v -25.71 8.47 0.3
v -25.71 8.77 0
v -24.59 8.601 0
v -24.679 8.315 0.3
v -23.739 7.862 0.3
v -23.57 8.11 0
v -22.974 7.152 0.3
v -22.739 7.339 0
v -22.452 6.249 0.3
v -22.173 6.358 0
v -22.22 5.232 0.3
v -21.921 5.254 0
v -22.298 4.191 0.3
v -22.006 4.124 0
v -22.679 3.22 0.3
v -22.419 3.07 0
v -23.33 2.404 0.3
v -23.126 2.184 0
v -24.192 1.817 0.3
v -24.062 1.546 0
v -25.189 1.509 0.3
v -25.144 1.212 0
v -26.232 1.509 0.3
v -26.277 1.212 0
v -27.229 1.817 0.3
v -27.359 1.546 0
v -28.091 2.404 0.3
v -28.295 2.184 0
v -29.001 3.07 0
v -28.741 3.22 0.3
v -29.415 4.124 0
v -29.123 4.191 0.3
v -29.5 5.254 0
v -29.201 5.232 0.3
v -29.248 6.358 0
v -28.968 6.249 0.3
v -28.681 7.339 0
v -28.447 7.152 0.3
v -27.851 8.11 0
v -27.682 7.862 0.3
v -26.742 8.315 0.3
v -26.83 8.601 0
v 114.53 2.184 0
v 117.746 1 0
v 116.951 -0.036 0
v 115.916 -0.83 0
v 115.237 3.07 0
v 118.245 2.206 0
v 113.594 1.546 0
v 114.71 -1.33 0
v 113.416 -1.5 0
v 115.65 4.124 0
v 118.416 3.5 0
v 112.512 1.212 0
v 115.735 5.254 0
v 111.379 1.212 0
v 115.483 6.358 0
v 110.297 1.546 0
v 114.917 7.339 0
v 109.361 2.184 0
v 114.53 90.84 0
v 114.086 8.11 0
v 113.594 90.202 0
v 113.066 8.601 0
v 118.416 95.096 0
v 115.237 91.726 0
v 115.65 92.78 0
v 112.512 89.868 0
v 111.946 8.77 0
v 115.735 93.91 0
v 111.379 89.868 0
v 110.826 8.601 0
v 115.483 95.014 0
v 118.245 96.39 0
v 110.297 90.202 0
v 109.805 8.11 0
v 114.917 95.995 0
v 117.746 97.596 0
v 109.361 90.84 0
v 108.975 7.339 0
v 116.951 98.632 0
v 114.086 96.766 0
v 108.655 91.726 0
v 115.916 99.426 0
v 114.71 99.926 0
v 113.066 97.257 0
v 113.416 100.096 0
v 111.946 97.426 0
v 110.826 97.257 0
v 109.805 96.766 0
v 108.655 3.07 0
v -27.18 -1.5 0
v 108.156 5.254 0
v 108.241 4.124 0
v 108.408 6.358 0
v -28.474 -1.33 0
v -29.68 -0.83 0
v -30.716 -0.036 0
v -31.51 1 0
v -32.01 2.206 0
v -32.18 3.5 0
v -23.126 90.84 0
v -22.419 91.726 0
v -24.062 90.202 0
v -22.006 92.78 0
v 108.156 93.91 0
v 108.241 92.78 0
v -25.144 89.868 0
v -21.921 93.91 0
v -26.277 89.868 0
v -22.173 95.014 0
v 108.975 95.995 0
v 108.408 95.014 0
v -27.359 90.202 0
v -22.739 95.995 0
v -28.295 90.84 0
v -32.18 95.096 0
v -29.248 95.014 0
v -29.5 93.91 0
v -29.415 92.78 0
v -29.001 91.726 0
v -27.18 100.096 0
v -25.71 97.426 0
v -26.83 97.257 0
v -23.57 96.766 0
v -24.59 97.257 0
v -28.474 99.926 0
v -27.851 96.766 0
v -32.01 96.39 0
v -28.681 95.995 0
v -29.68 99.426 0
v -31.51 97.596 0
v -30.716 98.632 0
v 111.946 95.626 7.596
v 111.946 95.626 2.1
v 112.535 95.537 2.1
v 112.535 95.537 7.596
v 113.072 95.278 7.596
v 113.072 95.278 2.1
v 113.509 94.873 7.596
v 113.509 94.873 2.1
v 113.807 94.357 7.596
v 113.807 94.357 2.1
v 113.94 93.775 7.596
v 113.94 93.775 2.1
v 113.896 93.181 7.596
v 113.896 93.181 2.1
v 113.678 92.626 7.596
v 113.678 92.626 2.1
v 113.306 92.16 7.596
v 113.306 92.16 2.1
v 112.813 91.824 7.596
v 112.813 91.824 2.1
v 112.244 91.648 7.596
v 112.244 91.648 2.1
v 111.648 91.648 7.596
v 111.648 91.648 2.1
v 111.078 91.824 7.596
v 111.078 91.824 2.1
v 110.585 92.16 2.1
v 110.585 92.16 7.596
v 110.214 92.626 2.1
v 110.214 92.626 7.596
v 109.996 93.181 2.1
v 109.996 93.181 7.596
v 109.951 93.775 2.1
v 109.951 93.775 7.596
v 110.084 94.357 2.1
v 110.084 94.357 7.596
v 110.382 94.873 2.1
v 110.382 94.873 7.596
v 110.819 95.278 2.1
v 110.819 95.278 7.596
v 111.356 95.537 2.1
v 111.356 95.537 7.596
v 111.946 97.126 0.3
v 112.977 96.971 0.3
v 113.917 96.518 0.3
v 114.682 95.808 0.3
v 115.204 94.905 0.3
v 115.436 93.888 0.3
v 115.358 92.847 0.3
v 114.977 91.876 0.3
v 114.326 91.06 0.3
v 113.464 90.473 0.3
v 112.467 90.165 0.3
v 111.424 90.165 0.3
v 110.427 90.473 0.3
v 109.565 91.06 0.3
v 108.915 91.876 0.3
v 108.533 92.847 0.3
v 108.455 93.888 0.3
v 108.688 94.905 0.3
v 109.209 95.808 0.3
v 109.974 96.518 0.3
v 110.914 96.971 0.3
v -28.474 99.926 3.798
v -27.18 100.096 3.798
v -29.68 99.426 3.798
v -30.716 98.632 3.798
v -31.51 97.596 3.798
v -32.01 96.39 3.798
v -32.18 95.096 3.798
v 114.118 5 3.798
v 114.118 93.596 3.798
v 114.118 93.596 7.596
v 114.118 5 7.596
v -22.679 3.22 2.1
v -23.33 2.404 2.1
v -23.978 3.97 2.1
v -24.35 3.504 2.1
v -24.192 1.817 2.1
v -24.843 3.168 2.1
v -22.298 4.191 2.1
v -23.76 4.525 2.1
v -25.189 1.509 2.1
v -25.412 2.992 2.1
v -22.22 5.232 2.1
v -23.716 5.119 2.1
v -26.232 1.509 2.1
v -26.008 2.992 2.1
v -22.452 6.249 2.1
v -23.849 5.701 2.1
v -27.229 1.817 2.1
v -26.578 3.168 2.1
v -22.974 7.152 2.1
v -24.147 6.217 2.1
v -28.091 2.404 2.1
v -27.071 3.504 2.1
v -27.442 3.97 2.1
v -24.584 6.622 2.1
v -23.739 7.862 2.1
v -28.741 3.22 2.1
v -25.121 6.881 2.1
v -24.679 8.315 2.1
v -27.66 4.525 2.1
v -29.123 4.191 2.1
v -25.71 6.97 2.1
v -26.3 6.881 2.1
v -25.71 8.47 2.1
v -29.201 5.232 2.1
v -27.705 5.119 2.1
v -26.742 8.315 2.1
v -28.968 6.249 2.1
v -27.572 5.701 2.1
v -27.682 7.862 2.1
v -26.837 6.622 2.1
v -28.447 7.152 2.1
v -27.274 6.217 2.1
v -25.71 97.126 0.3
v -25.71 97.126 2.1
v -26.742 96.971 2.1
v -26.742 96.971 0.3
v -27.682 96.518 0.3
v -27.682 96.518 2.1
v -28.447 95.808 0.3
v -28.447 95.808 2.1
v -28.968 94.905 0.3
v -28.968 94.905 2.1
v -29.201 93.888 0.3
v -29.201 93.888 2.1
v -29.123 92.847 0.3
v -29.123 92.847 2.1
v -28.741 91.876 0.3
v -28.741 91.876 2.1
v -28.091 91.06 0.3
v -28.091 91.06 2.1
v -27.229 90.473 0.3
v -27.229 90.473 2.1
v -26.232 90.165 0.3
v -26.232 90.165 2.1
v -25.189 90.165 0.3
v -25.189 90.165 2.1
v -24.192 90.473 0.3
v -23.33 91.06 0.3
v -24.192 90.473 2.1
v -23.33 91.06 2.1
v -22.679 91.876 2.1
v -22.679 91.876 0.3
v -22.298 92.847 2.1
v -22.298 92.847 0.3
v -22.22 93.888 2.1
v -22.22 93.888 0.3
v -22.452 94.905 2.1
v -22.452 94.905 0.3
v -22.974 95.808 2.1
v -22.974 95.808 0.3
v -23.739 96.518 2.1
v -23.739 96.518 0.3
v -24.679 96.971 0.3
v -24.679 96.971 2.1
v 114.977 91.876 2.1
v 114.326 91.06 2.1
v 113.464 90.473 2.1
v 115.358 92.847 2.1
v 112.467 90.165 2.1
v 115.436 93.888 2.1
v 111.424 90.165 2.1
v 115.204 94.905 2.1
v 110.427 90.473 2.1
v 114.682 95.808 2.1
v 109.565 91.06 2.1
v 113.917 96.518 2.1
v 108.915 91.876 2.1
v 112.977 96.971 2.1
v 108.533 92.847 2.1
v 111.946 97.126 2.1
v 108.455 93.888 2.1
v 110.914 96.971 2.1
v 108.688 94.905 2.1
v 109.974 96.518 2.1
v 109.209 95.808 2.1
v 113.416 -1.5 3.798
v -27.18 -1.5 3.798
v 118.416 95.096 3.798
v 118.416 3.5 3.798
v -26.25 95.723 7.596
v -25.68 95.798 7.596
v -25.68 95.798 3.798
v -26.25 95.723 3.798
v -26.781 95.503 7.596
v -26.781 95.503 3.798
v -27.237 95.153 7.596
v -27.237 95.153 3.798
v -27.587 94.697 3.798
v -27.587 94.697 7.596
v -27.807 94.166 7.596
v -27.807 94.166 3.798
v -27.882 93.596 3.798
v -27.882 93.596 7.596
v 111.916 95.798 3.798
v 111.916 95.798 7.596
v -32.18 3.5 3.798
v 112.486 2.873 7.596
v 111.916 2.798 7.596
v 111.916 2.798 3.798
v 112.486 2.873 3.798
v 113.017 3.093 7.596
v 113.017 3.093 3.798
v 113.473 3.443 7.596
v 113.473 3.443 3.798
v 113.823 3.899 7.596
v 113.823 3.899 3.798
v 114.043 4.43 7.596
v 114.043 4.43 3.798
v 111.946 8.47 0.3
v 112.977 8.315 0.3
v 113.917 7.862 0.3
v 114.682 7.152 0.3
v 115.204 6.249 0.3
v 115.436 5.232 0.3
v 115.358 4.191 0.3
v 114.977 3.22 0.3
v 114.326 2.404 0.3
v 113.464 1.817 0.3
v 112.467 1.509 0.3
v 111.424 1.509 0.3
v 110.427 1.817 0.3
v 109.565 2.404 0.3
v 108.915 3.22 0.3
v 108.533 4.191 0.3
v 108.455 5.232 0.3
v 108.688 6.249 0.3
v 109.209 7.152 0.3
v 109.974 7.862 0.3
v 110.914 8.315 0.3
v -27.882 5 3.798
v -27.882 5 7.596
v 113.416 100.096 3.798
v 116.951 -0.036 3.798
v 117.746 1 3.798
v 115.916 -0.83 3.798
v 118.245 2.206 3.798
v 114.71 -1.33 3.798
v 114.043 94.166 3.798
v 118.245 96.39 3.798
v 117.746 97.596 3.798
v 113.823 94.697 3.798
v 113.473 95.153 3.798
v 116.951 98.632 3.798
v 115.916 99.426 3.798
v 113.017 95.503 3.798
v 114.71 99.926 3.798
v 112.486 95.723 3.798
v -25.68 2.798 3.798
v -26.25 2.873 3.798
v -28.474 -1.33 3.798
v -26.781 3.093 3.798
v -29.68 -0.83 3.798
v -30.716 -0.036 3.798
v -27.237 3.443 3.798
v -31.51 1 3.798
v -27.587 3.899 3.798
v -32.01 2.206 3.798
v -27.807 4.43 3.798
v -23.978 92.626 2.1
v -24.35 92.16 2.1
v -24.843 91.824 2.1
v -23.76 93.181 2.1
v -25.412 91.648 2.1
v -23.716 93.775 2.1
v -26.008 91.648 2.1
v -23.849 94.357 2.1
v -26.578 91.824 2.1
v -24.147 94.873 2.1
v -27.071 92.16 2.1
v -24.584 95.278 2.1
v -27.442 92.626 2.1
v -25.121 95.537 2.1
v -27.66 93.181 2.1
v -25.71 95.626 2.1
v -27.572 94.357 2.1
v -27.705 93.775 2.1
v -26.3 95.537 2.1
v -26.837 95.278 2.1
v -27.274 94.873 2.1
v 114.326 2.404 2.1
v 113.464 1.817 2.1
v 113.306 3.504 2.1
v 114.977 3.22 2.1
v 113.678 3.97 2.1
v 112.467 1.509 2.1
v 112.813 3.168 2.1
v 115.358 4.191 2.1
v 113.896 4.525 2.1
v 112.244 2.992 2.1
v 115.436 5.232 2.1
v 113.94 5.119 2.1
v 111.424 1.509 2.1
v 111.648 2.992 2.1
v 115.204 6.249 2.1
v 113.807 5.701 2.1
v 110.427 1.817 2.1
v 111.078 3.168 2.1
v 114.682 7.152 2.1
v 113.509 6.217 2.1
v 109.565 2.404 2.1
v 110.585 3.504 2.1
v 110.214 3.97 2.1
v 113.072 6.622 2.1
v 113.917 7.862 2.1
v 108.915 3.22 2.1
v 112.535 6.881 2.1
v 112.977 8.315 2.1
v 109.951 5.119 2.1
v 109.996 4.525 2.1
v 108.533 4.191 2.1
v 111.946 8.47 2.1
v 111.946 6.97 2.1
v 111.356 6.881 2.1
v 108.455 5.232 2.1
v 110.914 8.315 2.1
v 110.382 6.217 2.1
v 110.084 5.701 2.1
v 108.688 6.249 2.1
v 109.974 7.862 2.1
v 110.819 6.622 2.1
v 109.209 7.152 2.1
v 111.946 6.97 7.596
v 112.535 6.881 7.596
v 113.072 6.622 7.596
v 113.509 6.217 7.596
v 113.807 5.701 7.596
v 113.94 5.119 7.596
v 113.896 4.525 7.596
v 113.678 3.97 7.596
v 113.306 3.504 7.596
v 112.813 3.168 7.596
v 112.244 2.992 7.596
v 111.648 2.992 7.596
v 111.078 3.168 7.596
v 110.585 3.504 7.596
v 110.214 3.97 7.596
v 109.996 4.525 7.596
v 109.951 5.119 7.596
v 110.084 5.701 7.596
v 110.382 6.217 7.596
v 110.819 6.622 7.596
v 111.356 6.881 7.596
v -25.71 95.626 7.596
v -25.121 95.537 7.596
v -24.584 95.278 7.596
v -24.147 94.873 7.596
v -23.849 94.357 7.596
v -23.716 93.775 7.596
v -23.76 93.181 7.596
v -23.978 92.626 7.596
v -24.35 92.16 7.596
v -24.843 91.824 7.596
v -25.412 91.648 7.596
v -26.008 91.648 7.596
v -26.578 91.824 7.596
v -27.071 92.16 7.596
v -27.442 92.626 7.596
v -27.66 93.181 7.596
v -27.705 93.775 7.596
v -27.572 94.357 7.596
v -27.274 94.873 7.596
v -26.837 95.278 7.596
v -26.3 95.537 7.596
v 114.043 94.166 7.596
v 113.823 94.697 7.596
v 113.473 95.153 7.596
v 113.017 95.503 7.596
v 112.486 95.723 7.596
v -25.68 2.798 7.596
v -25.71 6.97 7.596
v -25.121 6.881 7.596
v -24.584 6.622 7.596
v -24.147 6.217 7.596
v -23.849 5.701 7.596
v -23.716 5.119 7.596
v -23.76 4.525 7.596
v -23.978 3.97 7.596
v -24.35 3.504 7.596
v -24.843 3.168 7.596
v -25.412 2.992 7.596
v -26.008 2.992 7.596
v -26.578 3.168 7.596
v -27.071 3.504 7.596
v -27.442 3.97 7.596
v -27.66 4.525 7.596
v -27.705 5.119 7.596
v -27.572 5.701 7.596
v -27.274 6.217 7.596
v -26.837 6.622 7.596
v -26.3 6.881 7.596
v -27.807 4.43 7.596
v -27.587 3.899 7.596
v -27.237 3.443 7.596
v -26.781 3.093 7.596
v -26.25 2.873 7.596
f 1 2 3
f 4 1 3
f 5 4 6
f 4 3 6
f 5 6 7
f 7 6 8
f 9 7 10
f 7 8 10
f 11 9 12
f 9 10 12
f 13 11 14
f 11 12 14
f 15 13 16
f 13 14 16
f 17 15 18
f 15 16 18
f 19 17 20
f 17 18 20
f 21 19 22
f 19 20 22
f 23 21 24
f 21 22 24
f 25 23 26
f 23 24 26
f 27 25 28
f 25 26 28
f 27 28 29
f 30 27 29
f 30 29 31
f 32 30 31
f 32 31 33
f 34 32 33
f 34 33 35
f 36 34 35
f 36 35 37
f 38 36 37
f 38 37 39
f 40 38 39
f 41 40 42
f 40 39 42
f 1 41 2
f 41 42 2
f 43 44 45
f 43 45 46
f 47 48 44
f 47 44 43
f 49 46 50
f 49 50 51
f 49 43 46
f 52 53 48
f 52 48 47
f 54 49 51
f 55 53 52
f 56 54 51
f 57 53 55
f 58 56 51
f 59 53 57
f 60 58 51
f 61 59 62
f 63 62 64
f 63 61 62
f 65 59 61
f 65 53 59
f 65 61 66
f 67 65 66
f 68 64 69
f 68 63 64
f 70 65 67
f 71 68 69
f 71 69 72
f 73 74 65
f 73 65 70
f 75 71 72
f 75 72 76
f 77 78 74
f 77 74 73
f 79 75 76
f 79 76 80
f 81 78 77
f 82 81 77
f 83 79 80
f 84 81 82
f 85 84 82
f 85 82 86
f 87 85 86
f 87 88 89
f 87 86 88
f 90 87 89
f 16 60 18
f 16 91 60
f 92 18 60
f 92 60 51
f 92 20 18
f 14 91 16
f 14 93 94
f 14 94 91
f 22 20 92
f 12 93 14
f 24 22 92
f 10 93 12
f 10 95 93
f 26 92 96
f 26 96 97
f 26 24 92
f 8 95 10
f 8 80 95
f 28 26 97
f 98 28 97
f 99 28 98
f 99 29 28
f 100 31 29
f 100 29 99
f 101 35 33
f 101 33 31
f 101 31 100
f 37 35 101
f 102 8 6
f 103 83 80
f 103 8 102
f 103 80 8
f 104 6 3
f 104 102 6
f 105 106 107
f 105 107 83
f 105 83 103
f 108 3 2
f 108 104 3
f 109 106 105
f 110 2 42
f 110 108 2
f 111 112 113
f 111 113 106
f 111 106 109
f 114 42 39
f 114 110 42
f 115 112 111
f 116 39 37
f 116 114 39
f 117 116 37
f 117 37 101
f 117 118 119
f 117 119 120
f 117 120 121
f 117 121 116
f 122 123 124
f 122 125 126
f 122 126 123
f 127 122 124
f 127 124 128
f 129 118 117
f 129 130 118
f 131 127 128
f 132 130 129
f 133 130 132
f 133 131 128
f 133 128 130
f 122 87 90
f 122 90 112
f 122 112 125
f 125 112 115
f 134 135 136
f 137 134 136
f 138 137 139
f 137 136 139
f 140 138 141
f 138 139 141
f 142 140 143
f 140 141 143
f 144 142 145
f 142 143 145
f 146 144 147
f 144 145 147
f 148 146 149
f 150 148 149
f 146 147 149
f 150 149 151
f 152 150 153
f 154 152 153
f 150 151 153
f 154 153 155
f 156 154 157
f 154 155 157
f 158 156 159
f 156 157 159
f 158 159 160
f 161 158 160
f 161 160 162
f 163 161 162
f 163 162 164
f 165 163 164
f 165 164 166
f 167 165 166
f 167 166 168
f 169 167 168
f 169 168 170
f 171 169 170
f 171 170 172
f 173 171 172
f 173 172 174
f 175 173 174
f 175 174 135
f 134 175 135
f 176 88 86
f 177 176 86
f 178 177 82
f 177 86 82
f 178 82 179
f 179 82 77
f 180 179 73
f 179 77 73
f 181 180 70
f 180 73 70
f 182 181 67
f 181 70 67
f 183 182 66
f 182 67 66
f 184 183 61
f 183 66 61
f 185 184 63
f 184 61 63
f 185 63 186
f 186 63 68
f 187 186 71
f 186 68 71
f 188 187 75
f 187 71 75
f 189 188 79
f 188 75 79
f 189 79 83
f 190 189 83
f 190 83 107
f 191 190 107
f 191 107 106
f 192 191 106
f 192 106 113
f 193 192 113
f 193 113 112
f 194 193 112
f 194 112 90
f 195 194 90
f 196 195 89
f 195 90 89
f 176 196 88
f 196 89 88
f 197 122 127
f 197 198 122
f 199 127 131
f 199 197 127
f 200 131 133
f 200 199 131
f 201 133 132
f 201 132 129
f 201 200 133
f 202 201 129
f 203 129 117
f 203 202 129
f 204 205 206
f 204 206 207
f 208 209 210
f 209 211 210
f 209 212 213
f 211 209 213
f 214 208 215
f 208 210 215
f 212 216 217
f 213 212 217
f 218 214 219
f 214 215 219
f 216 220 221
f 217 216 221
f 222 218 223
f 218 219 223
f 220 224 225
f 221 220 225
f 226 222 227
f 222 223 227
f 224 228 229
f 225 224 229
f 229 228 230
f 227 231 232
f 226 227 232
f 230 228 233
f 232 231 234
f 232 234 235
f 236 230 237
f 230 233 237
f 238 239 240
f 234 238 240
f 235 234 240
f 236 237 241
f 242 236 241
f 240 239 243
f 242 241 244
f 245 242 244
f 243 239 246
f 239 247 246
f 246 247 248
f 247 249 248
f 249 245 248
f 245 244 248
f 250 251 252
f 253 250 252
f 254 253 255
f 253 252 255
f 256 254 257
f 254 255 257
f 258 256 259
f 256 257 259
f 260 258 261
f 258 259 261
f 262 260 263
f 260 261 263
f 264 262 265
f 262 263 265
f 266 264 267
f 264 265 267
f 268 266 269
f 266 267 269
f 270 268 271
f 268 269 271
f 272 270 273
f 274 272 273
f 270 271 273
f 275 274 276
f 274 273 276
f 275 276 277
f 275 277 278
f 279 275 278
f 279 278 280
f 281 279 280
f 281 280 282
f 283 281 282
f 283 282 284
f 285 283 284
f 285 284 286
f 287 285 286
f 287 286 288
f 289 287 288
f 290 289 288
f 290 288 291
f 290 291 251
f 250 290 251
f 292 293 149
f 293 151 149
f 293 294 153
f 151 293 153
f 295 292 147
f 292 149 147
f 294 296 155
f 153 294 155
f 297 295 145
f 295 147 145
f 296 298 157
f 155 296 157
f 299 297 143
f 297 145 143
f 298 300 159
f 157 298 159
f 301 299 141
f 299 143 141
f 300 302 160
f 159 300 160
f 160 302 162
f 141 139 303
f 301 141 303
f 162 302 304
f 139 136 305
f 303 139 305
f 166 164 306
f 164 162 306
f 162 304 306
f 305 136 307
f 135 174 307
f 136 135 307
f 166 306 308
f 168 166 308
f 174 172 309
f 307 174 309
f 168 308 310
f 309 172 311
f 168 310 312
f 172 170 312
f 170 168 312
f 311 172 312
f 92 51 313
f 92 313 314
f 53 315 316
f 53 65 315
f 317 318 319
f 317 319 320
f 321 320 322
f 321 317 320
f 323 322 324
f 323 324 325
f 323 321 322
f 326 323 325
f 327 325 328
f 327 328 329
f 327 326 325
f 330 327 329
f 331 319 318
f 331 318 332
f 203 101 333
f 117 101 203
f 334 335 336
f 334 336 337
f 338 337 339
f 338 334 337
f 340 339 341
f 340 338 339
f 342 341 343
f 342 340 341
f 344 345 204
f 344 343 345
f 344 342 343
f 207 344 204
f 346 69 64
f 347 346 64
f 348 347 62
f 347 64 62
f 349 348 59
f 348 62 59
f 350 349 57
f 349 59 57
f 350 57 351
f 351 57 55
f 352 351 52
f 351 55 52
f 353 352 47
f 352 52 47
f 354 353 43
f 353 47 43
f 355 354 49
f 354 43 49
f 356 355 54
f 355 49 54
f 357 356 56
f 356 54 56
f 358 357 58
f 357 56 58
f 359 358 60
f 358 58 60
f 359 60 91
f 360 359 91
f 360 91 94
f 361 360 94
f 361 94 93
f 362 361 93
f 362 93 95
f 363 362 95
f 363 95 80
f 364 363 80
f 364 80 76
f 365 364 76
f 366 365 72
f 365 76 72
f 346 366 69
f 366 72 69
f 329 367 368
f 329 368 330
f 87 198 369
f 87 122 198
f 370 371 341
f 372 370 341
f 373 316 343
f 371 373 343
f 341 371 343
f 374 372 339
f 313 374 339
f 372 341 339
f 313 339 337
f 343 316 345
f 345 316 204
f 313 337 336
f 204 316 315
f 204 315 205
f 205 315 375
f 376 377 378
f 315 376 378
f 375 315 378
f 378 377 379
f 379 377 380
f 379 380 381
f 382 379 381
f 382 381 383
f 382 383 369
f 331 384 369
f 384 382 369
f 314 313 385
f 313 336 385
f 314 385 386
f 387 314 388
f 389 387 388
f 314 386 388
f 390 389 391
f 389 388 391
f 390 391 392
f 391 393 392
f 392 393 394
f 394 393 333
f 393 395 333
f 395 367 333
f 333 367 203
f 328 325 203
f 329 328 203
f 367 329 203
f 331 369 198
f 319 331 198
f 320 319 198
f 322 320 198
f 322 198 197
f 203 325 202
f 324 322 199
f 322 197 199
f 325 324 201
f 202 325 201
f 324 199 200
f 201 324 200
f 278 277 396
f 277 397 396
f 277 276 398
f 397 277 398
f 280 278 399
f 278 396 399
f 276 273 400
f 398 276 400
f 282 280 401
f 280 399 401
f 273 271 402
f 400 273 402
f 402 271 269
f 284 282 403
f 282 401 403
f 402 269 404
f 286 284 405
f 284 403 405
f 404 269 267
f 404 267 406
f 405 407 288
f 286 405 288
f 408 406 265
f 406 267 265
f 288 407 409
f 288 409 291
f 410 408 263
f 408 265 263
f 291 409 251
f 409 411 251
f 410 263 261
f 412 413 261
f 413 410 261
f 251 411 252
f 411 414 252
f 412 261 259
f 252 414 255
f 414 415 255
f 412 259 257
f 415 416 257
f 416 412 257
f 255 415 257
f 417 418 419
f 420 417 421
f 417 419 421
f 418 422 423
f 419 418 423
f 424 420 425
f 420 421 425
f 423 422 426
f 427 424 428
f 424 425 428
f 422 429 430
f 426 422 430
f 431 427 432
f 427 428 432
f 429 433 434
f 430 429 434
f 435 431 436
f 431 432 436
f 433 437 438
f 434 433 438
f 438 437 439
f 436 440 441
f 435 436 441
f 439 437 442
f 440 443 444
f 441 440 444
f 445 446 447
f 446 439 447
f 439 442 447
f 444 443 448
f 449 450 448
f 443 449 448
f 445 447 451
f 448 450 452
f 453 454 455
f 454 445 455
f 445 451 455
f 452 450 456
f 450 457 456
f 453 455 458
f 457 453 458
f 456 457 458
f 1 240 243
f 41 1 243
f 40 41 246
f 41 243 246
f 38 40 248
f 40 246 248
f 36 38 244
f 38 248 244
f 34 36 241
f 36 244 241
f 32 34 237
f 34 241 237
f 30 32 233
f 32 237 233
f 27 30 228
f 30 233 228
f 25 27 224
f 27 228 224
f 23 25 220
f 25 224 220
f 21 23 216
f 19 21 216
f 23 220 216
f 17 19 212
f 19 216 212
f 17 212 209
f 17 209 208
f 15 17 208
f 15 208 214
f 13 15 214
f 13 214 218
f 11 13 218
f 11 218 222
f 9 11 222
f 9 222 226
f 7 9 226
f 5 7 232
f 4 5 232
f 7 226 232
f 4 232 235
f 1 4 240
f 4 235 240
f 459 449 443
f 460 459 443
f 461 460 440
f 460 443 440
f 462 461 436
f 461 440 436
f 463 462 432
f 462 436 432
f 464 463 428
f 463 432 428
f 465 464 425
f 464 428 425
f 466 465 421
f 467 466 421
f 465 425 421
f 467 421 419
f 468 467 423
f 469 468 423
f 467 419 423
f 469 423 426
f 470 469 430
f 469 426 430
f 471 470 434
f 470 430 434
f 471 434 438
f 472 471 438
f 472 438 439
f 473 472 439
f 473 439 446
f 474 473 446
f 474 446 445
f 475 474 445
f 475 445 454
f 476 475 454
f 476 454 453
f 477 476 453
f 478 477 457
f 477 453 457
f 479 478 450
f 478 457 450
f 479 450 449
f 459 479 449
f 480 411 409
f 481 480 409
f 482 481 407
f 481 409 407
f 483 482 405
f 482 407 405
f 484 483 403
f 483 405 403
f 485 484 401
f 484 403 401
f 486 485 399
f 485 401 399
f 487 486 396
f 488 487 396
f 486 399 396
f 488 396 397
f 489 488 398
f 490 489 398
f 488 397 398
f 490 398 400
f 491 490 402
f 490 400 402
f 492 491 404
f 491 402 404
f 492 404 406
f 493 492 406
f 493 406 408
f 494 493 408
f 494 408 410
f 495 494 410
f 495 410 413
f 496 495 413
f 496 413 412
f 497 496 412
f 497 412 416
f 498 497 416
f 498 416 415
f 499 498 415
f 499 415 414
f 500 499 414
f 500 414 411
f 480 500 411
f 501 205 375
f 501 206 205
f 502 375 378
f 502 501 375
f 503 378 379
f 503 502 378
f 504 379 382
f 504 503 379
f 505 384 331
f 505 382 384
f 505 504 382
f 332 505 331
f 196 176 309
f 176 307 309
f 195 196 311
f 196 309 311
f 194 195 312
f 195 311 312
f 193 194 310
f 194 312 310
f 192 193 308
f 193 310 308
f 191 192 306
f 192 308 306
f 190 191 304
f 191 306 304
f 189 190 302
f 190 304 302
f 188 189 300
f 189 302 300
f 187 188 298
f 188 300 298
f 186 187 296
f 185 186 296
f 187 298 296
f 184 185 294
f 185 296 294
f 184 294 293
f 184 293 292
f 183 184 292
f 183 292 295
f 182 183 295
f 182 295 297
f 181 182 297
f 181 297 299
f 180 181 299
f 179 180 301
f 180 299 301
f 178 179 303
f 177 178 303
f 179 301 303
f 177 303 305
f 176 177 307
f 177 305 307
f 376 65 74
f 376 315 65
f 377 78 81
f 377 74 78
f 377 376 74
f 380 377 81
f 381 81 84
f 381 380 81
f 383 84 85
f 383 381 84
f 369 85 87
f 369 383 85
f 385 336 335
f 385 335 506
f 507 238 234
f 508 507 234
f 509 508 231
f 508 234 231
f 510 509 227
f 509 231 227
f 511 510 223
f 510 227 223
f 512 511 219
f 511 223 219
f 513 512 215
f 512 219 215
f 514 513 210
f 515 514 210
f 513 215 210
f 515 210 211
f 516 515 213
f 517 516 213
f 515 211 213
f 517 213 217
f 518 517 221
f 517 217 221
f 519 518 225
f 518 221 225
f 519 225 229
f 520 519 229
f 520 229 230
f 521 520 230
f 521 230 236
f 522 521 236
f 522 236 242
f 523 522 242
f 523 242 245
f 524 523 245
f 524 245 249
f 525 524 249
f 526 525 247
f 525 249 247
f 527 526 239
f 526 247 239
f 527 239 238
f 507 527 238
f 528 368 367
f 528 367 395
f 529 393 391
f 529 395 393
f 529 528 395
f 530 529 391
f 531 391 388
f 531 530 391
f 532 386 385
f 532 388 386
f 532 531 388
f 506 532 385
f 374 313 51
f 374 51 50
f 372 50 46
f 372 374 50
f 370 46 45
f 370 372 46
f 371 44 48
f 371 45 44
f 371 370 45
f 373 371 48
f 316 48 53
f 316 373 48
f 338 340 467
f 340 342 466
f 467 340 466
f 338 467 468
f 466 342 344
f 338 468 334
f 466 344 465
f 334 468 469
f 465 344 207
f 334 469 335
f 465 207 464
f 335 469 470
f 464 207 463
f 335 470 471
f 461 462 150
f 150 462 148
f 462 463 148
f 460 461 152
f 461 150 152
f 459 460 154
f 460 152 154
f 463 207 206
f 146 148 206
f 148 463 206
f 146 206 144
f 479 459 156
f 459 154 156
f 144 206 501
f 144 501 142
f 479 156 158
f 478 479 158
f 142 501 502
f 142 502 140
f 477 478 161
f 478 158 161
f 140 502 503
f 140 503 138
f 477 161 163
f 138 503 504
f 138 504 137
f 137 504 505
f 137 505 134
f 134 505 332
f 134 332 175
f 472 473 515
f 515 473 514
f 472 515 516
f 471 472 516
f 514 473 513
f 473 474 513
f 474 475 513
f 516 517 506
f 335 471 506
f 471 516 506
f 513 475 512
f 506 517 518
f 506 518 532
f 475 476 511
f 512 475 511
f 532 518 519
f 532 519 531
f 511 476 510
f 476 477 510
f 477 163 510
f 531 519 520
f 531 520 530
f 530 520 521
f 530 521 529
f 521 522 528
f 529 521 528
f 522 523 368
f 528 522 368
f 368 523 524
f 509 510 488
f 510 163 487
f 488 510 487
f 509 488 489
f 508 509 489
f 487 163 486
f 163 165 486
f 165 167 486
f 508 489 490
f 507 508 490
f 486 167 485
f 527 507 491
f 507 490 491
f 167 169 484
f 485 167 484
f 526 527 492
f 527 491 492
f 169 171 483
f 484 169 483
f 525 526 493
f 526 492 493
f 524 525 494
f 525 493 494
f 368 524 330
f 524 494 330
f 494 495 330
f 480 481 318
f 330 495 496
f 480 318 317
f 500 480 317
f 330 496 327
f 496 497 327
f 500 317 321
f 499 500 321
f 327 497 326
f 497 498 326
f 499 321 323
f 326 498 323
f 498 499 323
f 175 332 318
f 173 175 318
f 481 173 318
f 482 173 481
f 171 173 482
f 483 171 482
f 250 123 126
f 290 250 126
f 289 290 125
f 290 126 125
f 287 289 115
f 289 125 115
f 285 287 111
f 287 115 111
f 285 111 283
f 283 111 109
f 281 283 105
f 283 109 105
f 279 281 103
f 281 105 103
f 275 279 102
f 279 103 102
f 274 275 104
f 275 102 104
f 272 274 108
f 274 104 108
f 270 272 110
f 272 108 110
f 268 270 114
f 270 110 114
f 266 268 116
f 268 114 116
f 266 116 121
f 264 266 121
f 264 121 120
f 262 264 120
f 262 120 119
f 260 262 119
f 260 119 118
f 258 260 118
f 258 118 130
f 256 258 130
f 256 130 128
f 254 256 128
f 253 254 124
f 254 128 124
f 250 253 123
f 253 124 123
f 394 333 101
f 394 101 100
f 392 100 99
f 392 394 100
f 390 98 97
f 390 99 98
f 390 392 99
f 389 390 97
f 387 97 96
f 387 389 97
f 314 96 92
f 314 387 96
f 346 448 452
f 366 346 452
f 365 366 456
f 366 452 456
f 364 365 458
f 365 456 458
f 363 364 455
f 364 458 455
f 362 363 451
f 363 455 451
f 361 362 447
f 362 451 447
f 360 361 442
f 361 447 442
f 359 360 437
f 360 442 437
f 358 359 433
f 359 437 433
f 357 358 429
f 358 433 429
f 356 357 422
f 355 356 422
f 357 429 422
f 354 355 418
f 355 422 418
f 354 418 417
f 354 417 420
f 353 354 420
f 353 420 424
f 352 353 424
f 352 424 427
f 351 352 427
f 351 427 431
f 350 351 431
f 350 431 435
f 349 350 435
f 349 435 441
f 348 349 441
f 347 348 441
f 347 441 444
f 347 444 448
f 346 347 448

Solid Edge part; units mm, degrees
sketch "Sketch1" plane through (0, 0, 0) normal (0, 0, 1) x (1, 0, 0)
  line L0 (-32.1803, 100.096) -> (118.4157, 100.096)
  line L1 (118.4157, 100.096) -> (118.4157, -1.5)
  line L2 (118.4157, -1.5) -> (-32.1803, -1.5)
  line L3 (-32.1803, -1.5) -> (-32.1803, 100.096)
  dimension "D1" = 101.596
  dimension "D2" = 150.596
extrude "Basiskörper" add sketch "Sketch1" along normal blind 3.798
fillet "Round1" radius 5 4 edges at (118.4157, 100.096, 1.899) (118.4157, -1.5, 1.899) (-32.1803, -1.5, 1.899) (-32.1803, 100.096, 1.899)
sketch "Sketch2" plane through (11.6177, 37.298, 3.798) normal (0, 0, 1) x (1, 0, 0)
  line L0 (-39.5, 58.5) -> (102.5, 58.5)
  line L1 (102.5, 58.5) -> (102.5, -34.5)
  line L2 (102.5, -34.5) -> (-39.5, -34.5)
  line L3 (-39.5, -34.5) -> (-39.5, 58.5)
  dimension "D1" = 142
  dimension "D2" = 93
extrude "Protrusion1" add sketch "Sketch2" along normal blind 3.798
fillet "Round2" radius 2.202 4 edges at (-27.8823, 95.798, 5.697) (-27.8823, 2.798, 5.697) (114.1177, 2.798, 5.697) (114.1177, 95.798, 5.697)
hole "Hole1" at (111.9457, 4.97, 0) direction (0, 0, 1) diameter 4 end through all counterbore diameter 7 counterbore depth 2.1 start chamfer 0.3 start chamfer angle 45
hole "Hole2" at (111.9457, 93.626, 0) direction (0, 0, 1) diameter 4 end through all counterbore diameter 7 counterbore depth 2.1 start chamfer 0.3 start chamfer angle 45
hole "Hole3" at (-25.7103, 93.626, 0) direction (0, 0, 1) diameter 4 end through all counterbore diameter 7 counterbore depth 2.1 start chamfer 0.3 start chamfer angle 45
hole "Hole4" at (-25.7103, 4.97, 0) direction (0, 0, 1) diameter 4 end through all counterbore diameter 7 counterbore depth 2.1 start chamfer 0.3 start chamfer angle 45
properties material "ASA"
